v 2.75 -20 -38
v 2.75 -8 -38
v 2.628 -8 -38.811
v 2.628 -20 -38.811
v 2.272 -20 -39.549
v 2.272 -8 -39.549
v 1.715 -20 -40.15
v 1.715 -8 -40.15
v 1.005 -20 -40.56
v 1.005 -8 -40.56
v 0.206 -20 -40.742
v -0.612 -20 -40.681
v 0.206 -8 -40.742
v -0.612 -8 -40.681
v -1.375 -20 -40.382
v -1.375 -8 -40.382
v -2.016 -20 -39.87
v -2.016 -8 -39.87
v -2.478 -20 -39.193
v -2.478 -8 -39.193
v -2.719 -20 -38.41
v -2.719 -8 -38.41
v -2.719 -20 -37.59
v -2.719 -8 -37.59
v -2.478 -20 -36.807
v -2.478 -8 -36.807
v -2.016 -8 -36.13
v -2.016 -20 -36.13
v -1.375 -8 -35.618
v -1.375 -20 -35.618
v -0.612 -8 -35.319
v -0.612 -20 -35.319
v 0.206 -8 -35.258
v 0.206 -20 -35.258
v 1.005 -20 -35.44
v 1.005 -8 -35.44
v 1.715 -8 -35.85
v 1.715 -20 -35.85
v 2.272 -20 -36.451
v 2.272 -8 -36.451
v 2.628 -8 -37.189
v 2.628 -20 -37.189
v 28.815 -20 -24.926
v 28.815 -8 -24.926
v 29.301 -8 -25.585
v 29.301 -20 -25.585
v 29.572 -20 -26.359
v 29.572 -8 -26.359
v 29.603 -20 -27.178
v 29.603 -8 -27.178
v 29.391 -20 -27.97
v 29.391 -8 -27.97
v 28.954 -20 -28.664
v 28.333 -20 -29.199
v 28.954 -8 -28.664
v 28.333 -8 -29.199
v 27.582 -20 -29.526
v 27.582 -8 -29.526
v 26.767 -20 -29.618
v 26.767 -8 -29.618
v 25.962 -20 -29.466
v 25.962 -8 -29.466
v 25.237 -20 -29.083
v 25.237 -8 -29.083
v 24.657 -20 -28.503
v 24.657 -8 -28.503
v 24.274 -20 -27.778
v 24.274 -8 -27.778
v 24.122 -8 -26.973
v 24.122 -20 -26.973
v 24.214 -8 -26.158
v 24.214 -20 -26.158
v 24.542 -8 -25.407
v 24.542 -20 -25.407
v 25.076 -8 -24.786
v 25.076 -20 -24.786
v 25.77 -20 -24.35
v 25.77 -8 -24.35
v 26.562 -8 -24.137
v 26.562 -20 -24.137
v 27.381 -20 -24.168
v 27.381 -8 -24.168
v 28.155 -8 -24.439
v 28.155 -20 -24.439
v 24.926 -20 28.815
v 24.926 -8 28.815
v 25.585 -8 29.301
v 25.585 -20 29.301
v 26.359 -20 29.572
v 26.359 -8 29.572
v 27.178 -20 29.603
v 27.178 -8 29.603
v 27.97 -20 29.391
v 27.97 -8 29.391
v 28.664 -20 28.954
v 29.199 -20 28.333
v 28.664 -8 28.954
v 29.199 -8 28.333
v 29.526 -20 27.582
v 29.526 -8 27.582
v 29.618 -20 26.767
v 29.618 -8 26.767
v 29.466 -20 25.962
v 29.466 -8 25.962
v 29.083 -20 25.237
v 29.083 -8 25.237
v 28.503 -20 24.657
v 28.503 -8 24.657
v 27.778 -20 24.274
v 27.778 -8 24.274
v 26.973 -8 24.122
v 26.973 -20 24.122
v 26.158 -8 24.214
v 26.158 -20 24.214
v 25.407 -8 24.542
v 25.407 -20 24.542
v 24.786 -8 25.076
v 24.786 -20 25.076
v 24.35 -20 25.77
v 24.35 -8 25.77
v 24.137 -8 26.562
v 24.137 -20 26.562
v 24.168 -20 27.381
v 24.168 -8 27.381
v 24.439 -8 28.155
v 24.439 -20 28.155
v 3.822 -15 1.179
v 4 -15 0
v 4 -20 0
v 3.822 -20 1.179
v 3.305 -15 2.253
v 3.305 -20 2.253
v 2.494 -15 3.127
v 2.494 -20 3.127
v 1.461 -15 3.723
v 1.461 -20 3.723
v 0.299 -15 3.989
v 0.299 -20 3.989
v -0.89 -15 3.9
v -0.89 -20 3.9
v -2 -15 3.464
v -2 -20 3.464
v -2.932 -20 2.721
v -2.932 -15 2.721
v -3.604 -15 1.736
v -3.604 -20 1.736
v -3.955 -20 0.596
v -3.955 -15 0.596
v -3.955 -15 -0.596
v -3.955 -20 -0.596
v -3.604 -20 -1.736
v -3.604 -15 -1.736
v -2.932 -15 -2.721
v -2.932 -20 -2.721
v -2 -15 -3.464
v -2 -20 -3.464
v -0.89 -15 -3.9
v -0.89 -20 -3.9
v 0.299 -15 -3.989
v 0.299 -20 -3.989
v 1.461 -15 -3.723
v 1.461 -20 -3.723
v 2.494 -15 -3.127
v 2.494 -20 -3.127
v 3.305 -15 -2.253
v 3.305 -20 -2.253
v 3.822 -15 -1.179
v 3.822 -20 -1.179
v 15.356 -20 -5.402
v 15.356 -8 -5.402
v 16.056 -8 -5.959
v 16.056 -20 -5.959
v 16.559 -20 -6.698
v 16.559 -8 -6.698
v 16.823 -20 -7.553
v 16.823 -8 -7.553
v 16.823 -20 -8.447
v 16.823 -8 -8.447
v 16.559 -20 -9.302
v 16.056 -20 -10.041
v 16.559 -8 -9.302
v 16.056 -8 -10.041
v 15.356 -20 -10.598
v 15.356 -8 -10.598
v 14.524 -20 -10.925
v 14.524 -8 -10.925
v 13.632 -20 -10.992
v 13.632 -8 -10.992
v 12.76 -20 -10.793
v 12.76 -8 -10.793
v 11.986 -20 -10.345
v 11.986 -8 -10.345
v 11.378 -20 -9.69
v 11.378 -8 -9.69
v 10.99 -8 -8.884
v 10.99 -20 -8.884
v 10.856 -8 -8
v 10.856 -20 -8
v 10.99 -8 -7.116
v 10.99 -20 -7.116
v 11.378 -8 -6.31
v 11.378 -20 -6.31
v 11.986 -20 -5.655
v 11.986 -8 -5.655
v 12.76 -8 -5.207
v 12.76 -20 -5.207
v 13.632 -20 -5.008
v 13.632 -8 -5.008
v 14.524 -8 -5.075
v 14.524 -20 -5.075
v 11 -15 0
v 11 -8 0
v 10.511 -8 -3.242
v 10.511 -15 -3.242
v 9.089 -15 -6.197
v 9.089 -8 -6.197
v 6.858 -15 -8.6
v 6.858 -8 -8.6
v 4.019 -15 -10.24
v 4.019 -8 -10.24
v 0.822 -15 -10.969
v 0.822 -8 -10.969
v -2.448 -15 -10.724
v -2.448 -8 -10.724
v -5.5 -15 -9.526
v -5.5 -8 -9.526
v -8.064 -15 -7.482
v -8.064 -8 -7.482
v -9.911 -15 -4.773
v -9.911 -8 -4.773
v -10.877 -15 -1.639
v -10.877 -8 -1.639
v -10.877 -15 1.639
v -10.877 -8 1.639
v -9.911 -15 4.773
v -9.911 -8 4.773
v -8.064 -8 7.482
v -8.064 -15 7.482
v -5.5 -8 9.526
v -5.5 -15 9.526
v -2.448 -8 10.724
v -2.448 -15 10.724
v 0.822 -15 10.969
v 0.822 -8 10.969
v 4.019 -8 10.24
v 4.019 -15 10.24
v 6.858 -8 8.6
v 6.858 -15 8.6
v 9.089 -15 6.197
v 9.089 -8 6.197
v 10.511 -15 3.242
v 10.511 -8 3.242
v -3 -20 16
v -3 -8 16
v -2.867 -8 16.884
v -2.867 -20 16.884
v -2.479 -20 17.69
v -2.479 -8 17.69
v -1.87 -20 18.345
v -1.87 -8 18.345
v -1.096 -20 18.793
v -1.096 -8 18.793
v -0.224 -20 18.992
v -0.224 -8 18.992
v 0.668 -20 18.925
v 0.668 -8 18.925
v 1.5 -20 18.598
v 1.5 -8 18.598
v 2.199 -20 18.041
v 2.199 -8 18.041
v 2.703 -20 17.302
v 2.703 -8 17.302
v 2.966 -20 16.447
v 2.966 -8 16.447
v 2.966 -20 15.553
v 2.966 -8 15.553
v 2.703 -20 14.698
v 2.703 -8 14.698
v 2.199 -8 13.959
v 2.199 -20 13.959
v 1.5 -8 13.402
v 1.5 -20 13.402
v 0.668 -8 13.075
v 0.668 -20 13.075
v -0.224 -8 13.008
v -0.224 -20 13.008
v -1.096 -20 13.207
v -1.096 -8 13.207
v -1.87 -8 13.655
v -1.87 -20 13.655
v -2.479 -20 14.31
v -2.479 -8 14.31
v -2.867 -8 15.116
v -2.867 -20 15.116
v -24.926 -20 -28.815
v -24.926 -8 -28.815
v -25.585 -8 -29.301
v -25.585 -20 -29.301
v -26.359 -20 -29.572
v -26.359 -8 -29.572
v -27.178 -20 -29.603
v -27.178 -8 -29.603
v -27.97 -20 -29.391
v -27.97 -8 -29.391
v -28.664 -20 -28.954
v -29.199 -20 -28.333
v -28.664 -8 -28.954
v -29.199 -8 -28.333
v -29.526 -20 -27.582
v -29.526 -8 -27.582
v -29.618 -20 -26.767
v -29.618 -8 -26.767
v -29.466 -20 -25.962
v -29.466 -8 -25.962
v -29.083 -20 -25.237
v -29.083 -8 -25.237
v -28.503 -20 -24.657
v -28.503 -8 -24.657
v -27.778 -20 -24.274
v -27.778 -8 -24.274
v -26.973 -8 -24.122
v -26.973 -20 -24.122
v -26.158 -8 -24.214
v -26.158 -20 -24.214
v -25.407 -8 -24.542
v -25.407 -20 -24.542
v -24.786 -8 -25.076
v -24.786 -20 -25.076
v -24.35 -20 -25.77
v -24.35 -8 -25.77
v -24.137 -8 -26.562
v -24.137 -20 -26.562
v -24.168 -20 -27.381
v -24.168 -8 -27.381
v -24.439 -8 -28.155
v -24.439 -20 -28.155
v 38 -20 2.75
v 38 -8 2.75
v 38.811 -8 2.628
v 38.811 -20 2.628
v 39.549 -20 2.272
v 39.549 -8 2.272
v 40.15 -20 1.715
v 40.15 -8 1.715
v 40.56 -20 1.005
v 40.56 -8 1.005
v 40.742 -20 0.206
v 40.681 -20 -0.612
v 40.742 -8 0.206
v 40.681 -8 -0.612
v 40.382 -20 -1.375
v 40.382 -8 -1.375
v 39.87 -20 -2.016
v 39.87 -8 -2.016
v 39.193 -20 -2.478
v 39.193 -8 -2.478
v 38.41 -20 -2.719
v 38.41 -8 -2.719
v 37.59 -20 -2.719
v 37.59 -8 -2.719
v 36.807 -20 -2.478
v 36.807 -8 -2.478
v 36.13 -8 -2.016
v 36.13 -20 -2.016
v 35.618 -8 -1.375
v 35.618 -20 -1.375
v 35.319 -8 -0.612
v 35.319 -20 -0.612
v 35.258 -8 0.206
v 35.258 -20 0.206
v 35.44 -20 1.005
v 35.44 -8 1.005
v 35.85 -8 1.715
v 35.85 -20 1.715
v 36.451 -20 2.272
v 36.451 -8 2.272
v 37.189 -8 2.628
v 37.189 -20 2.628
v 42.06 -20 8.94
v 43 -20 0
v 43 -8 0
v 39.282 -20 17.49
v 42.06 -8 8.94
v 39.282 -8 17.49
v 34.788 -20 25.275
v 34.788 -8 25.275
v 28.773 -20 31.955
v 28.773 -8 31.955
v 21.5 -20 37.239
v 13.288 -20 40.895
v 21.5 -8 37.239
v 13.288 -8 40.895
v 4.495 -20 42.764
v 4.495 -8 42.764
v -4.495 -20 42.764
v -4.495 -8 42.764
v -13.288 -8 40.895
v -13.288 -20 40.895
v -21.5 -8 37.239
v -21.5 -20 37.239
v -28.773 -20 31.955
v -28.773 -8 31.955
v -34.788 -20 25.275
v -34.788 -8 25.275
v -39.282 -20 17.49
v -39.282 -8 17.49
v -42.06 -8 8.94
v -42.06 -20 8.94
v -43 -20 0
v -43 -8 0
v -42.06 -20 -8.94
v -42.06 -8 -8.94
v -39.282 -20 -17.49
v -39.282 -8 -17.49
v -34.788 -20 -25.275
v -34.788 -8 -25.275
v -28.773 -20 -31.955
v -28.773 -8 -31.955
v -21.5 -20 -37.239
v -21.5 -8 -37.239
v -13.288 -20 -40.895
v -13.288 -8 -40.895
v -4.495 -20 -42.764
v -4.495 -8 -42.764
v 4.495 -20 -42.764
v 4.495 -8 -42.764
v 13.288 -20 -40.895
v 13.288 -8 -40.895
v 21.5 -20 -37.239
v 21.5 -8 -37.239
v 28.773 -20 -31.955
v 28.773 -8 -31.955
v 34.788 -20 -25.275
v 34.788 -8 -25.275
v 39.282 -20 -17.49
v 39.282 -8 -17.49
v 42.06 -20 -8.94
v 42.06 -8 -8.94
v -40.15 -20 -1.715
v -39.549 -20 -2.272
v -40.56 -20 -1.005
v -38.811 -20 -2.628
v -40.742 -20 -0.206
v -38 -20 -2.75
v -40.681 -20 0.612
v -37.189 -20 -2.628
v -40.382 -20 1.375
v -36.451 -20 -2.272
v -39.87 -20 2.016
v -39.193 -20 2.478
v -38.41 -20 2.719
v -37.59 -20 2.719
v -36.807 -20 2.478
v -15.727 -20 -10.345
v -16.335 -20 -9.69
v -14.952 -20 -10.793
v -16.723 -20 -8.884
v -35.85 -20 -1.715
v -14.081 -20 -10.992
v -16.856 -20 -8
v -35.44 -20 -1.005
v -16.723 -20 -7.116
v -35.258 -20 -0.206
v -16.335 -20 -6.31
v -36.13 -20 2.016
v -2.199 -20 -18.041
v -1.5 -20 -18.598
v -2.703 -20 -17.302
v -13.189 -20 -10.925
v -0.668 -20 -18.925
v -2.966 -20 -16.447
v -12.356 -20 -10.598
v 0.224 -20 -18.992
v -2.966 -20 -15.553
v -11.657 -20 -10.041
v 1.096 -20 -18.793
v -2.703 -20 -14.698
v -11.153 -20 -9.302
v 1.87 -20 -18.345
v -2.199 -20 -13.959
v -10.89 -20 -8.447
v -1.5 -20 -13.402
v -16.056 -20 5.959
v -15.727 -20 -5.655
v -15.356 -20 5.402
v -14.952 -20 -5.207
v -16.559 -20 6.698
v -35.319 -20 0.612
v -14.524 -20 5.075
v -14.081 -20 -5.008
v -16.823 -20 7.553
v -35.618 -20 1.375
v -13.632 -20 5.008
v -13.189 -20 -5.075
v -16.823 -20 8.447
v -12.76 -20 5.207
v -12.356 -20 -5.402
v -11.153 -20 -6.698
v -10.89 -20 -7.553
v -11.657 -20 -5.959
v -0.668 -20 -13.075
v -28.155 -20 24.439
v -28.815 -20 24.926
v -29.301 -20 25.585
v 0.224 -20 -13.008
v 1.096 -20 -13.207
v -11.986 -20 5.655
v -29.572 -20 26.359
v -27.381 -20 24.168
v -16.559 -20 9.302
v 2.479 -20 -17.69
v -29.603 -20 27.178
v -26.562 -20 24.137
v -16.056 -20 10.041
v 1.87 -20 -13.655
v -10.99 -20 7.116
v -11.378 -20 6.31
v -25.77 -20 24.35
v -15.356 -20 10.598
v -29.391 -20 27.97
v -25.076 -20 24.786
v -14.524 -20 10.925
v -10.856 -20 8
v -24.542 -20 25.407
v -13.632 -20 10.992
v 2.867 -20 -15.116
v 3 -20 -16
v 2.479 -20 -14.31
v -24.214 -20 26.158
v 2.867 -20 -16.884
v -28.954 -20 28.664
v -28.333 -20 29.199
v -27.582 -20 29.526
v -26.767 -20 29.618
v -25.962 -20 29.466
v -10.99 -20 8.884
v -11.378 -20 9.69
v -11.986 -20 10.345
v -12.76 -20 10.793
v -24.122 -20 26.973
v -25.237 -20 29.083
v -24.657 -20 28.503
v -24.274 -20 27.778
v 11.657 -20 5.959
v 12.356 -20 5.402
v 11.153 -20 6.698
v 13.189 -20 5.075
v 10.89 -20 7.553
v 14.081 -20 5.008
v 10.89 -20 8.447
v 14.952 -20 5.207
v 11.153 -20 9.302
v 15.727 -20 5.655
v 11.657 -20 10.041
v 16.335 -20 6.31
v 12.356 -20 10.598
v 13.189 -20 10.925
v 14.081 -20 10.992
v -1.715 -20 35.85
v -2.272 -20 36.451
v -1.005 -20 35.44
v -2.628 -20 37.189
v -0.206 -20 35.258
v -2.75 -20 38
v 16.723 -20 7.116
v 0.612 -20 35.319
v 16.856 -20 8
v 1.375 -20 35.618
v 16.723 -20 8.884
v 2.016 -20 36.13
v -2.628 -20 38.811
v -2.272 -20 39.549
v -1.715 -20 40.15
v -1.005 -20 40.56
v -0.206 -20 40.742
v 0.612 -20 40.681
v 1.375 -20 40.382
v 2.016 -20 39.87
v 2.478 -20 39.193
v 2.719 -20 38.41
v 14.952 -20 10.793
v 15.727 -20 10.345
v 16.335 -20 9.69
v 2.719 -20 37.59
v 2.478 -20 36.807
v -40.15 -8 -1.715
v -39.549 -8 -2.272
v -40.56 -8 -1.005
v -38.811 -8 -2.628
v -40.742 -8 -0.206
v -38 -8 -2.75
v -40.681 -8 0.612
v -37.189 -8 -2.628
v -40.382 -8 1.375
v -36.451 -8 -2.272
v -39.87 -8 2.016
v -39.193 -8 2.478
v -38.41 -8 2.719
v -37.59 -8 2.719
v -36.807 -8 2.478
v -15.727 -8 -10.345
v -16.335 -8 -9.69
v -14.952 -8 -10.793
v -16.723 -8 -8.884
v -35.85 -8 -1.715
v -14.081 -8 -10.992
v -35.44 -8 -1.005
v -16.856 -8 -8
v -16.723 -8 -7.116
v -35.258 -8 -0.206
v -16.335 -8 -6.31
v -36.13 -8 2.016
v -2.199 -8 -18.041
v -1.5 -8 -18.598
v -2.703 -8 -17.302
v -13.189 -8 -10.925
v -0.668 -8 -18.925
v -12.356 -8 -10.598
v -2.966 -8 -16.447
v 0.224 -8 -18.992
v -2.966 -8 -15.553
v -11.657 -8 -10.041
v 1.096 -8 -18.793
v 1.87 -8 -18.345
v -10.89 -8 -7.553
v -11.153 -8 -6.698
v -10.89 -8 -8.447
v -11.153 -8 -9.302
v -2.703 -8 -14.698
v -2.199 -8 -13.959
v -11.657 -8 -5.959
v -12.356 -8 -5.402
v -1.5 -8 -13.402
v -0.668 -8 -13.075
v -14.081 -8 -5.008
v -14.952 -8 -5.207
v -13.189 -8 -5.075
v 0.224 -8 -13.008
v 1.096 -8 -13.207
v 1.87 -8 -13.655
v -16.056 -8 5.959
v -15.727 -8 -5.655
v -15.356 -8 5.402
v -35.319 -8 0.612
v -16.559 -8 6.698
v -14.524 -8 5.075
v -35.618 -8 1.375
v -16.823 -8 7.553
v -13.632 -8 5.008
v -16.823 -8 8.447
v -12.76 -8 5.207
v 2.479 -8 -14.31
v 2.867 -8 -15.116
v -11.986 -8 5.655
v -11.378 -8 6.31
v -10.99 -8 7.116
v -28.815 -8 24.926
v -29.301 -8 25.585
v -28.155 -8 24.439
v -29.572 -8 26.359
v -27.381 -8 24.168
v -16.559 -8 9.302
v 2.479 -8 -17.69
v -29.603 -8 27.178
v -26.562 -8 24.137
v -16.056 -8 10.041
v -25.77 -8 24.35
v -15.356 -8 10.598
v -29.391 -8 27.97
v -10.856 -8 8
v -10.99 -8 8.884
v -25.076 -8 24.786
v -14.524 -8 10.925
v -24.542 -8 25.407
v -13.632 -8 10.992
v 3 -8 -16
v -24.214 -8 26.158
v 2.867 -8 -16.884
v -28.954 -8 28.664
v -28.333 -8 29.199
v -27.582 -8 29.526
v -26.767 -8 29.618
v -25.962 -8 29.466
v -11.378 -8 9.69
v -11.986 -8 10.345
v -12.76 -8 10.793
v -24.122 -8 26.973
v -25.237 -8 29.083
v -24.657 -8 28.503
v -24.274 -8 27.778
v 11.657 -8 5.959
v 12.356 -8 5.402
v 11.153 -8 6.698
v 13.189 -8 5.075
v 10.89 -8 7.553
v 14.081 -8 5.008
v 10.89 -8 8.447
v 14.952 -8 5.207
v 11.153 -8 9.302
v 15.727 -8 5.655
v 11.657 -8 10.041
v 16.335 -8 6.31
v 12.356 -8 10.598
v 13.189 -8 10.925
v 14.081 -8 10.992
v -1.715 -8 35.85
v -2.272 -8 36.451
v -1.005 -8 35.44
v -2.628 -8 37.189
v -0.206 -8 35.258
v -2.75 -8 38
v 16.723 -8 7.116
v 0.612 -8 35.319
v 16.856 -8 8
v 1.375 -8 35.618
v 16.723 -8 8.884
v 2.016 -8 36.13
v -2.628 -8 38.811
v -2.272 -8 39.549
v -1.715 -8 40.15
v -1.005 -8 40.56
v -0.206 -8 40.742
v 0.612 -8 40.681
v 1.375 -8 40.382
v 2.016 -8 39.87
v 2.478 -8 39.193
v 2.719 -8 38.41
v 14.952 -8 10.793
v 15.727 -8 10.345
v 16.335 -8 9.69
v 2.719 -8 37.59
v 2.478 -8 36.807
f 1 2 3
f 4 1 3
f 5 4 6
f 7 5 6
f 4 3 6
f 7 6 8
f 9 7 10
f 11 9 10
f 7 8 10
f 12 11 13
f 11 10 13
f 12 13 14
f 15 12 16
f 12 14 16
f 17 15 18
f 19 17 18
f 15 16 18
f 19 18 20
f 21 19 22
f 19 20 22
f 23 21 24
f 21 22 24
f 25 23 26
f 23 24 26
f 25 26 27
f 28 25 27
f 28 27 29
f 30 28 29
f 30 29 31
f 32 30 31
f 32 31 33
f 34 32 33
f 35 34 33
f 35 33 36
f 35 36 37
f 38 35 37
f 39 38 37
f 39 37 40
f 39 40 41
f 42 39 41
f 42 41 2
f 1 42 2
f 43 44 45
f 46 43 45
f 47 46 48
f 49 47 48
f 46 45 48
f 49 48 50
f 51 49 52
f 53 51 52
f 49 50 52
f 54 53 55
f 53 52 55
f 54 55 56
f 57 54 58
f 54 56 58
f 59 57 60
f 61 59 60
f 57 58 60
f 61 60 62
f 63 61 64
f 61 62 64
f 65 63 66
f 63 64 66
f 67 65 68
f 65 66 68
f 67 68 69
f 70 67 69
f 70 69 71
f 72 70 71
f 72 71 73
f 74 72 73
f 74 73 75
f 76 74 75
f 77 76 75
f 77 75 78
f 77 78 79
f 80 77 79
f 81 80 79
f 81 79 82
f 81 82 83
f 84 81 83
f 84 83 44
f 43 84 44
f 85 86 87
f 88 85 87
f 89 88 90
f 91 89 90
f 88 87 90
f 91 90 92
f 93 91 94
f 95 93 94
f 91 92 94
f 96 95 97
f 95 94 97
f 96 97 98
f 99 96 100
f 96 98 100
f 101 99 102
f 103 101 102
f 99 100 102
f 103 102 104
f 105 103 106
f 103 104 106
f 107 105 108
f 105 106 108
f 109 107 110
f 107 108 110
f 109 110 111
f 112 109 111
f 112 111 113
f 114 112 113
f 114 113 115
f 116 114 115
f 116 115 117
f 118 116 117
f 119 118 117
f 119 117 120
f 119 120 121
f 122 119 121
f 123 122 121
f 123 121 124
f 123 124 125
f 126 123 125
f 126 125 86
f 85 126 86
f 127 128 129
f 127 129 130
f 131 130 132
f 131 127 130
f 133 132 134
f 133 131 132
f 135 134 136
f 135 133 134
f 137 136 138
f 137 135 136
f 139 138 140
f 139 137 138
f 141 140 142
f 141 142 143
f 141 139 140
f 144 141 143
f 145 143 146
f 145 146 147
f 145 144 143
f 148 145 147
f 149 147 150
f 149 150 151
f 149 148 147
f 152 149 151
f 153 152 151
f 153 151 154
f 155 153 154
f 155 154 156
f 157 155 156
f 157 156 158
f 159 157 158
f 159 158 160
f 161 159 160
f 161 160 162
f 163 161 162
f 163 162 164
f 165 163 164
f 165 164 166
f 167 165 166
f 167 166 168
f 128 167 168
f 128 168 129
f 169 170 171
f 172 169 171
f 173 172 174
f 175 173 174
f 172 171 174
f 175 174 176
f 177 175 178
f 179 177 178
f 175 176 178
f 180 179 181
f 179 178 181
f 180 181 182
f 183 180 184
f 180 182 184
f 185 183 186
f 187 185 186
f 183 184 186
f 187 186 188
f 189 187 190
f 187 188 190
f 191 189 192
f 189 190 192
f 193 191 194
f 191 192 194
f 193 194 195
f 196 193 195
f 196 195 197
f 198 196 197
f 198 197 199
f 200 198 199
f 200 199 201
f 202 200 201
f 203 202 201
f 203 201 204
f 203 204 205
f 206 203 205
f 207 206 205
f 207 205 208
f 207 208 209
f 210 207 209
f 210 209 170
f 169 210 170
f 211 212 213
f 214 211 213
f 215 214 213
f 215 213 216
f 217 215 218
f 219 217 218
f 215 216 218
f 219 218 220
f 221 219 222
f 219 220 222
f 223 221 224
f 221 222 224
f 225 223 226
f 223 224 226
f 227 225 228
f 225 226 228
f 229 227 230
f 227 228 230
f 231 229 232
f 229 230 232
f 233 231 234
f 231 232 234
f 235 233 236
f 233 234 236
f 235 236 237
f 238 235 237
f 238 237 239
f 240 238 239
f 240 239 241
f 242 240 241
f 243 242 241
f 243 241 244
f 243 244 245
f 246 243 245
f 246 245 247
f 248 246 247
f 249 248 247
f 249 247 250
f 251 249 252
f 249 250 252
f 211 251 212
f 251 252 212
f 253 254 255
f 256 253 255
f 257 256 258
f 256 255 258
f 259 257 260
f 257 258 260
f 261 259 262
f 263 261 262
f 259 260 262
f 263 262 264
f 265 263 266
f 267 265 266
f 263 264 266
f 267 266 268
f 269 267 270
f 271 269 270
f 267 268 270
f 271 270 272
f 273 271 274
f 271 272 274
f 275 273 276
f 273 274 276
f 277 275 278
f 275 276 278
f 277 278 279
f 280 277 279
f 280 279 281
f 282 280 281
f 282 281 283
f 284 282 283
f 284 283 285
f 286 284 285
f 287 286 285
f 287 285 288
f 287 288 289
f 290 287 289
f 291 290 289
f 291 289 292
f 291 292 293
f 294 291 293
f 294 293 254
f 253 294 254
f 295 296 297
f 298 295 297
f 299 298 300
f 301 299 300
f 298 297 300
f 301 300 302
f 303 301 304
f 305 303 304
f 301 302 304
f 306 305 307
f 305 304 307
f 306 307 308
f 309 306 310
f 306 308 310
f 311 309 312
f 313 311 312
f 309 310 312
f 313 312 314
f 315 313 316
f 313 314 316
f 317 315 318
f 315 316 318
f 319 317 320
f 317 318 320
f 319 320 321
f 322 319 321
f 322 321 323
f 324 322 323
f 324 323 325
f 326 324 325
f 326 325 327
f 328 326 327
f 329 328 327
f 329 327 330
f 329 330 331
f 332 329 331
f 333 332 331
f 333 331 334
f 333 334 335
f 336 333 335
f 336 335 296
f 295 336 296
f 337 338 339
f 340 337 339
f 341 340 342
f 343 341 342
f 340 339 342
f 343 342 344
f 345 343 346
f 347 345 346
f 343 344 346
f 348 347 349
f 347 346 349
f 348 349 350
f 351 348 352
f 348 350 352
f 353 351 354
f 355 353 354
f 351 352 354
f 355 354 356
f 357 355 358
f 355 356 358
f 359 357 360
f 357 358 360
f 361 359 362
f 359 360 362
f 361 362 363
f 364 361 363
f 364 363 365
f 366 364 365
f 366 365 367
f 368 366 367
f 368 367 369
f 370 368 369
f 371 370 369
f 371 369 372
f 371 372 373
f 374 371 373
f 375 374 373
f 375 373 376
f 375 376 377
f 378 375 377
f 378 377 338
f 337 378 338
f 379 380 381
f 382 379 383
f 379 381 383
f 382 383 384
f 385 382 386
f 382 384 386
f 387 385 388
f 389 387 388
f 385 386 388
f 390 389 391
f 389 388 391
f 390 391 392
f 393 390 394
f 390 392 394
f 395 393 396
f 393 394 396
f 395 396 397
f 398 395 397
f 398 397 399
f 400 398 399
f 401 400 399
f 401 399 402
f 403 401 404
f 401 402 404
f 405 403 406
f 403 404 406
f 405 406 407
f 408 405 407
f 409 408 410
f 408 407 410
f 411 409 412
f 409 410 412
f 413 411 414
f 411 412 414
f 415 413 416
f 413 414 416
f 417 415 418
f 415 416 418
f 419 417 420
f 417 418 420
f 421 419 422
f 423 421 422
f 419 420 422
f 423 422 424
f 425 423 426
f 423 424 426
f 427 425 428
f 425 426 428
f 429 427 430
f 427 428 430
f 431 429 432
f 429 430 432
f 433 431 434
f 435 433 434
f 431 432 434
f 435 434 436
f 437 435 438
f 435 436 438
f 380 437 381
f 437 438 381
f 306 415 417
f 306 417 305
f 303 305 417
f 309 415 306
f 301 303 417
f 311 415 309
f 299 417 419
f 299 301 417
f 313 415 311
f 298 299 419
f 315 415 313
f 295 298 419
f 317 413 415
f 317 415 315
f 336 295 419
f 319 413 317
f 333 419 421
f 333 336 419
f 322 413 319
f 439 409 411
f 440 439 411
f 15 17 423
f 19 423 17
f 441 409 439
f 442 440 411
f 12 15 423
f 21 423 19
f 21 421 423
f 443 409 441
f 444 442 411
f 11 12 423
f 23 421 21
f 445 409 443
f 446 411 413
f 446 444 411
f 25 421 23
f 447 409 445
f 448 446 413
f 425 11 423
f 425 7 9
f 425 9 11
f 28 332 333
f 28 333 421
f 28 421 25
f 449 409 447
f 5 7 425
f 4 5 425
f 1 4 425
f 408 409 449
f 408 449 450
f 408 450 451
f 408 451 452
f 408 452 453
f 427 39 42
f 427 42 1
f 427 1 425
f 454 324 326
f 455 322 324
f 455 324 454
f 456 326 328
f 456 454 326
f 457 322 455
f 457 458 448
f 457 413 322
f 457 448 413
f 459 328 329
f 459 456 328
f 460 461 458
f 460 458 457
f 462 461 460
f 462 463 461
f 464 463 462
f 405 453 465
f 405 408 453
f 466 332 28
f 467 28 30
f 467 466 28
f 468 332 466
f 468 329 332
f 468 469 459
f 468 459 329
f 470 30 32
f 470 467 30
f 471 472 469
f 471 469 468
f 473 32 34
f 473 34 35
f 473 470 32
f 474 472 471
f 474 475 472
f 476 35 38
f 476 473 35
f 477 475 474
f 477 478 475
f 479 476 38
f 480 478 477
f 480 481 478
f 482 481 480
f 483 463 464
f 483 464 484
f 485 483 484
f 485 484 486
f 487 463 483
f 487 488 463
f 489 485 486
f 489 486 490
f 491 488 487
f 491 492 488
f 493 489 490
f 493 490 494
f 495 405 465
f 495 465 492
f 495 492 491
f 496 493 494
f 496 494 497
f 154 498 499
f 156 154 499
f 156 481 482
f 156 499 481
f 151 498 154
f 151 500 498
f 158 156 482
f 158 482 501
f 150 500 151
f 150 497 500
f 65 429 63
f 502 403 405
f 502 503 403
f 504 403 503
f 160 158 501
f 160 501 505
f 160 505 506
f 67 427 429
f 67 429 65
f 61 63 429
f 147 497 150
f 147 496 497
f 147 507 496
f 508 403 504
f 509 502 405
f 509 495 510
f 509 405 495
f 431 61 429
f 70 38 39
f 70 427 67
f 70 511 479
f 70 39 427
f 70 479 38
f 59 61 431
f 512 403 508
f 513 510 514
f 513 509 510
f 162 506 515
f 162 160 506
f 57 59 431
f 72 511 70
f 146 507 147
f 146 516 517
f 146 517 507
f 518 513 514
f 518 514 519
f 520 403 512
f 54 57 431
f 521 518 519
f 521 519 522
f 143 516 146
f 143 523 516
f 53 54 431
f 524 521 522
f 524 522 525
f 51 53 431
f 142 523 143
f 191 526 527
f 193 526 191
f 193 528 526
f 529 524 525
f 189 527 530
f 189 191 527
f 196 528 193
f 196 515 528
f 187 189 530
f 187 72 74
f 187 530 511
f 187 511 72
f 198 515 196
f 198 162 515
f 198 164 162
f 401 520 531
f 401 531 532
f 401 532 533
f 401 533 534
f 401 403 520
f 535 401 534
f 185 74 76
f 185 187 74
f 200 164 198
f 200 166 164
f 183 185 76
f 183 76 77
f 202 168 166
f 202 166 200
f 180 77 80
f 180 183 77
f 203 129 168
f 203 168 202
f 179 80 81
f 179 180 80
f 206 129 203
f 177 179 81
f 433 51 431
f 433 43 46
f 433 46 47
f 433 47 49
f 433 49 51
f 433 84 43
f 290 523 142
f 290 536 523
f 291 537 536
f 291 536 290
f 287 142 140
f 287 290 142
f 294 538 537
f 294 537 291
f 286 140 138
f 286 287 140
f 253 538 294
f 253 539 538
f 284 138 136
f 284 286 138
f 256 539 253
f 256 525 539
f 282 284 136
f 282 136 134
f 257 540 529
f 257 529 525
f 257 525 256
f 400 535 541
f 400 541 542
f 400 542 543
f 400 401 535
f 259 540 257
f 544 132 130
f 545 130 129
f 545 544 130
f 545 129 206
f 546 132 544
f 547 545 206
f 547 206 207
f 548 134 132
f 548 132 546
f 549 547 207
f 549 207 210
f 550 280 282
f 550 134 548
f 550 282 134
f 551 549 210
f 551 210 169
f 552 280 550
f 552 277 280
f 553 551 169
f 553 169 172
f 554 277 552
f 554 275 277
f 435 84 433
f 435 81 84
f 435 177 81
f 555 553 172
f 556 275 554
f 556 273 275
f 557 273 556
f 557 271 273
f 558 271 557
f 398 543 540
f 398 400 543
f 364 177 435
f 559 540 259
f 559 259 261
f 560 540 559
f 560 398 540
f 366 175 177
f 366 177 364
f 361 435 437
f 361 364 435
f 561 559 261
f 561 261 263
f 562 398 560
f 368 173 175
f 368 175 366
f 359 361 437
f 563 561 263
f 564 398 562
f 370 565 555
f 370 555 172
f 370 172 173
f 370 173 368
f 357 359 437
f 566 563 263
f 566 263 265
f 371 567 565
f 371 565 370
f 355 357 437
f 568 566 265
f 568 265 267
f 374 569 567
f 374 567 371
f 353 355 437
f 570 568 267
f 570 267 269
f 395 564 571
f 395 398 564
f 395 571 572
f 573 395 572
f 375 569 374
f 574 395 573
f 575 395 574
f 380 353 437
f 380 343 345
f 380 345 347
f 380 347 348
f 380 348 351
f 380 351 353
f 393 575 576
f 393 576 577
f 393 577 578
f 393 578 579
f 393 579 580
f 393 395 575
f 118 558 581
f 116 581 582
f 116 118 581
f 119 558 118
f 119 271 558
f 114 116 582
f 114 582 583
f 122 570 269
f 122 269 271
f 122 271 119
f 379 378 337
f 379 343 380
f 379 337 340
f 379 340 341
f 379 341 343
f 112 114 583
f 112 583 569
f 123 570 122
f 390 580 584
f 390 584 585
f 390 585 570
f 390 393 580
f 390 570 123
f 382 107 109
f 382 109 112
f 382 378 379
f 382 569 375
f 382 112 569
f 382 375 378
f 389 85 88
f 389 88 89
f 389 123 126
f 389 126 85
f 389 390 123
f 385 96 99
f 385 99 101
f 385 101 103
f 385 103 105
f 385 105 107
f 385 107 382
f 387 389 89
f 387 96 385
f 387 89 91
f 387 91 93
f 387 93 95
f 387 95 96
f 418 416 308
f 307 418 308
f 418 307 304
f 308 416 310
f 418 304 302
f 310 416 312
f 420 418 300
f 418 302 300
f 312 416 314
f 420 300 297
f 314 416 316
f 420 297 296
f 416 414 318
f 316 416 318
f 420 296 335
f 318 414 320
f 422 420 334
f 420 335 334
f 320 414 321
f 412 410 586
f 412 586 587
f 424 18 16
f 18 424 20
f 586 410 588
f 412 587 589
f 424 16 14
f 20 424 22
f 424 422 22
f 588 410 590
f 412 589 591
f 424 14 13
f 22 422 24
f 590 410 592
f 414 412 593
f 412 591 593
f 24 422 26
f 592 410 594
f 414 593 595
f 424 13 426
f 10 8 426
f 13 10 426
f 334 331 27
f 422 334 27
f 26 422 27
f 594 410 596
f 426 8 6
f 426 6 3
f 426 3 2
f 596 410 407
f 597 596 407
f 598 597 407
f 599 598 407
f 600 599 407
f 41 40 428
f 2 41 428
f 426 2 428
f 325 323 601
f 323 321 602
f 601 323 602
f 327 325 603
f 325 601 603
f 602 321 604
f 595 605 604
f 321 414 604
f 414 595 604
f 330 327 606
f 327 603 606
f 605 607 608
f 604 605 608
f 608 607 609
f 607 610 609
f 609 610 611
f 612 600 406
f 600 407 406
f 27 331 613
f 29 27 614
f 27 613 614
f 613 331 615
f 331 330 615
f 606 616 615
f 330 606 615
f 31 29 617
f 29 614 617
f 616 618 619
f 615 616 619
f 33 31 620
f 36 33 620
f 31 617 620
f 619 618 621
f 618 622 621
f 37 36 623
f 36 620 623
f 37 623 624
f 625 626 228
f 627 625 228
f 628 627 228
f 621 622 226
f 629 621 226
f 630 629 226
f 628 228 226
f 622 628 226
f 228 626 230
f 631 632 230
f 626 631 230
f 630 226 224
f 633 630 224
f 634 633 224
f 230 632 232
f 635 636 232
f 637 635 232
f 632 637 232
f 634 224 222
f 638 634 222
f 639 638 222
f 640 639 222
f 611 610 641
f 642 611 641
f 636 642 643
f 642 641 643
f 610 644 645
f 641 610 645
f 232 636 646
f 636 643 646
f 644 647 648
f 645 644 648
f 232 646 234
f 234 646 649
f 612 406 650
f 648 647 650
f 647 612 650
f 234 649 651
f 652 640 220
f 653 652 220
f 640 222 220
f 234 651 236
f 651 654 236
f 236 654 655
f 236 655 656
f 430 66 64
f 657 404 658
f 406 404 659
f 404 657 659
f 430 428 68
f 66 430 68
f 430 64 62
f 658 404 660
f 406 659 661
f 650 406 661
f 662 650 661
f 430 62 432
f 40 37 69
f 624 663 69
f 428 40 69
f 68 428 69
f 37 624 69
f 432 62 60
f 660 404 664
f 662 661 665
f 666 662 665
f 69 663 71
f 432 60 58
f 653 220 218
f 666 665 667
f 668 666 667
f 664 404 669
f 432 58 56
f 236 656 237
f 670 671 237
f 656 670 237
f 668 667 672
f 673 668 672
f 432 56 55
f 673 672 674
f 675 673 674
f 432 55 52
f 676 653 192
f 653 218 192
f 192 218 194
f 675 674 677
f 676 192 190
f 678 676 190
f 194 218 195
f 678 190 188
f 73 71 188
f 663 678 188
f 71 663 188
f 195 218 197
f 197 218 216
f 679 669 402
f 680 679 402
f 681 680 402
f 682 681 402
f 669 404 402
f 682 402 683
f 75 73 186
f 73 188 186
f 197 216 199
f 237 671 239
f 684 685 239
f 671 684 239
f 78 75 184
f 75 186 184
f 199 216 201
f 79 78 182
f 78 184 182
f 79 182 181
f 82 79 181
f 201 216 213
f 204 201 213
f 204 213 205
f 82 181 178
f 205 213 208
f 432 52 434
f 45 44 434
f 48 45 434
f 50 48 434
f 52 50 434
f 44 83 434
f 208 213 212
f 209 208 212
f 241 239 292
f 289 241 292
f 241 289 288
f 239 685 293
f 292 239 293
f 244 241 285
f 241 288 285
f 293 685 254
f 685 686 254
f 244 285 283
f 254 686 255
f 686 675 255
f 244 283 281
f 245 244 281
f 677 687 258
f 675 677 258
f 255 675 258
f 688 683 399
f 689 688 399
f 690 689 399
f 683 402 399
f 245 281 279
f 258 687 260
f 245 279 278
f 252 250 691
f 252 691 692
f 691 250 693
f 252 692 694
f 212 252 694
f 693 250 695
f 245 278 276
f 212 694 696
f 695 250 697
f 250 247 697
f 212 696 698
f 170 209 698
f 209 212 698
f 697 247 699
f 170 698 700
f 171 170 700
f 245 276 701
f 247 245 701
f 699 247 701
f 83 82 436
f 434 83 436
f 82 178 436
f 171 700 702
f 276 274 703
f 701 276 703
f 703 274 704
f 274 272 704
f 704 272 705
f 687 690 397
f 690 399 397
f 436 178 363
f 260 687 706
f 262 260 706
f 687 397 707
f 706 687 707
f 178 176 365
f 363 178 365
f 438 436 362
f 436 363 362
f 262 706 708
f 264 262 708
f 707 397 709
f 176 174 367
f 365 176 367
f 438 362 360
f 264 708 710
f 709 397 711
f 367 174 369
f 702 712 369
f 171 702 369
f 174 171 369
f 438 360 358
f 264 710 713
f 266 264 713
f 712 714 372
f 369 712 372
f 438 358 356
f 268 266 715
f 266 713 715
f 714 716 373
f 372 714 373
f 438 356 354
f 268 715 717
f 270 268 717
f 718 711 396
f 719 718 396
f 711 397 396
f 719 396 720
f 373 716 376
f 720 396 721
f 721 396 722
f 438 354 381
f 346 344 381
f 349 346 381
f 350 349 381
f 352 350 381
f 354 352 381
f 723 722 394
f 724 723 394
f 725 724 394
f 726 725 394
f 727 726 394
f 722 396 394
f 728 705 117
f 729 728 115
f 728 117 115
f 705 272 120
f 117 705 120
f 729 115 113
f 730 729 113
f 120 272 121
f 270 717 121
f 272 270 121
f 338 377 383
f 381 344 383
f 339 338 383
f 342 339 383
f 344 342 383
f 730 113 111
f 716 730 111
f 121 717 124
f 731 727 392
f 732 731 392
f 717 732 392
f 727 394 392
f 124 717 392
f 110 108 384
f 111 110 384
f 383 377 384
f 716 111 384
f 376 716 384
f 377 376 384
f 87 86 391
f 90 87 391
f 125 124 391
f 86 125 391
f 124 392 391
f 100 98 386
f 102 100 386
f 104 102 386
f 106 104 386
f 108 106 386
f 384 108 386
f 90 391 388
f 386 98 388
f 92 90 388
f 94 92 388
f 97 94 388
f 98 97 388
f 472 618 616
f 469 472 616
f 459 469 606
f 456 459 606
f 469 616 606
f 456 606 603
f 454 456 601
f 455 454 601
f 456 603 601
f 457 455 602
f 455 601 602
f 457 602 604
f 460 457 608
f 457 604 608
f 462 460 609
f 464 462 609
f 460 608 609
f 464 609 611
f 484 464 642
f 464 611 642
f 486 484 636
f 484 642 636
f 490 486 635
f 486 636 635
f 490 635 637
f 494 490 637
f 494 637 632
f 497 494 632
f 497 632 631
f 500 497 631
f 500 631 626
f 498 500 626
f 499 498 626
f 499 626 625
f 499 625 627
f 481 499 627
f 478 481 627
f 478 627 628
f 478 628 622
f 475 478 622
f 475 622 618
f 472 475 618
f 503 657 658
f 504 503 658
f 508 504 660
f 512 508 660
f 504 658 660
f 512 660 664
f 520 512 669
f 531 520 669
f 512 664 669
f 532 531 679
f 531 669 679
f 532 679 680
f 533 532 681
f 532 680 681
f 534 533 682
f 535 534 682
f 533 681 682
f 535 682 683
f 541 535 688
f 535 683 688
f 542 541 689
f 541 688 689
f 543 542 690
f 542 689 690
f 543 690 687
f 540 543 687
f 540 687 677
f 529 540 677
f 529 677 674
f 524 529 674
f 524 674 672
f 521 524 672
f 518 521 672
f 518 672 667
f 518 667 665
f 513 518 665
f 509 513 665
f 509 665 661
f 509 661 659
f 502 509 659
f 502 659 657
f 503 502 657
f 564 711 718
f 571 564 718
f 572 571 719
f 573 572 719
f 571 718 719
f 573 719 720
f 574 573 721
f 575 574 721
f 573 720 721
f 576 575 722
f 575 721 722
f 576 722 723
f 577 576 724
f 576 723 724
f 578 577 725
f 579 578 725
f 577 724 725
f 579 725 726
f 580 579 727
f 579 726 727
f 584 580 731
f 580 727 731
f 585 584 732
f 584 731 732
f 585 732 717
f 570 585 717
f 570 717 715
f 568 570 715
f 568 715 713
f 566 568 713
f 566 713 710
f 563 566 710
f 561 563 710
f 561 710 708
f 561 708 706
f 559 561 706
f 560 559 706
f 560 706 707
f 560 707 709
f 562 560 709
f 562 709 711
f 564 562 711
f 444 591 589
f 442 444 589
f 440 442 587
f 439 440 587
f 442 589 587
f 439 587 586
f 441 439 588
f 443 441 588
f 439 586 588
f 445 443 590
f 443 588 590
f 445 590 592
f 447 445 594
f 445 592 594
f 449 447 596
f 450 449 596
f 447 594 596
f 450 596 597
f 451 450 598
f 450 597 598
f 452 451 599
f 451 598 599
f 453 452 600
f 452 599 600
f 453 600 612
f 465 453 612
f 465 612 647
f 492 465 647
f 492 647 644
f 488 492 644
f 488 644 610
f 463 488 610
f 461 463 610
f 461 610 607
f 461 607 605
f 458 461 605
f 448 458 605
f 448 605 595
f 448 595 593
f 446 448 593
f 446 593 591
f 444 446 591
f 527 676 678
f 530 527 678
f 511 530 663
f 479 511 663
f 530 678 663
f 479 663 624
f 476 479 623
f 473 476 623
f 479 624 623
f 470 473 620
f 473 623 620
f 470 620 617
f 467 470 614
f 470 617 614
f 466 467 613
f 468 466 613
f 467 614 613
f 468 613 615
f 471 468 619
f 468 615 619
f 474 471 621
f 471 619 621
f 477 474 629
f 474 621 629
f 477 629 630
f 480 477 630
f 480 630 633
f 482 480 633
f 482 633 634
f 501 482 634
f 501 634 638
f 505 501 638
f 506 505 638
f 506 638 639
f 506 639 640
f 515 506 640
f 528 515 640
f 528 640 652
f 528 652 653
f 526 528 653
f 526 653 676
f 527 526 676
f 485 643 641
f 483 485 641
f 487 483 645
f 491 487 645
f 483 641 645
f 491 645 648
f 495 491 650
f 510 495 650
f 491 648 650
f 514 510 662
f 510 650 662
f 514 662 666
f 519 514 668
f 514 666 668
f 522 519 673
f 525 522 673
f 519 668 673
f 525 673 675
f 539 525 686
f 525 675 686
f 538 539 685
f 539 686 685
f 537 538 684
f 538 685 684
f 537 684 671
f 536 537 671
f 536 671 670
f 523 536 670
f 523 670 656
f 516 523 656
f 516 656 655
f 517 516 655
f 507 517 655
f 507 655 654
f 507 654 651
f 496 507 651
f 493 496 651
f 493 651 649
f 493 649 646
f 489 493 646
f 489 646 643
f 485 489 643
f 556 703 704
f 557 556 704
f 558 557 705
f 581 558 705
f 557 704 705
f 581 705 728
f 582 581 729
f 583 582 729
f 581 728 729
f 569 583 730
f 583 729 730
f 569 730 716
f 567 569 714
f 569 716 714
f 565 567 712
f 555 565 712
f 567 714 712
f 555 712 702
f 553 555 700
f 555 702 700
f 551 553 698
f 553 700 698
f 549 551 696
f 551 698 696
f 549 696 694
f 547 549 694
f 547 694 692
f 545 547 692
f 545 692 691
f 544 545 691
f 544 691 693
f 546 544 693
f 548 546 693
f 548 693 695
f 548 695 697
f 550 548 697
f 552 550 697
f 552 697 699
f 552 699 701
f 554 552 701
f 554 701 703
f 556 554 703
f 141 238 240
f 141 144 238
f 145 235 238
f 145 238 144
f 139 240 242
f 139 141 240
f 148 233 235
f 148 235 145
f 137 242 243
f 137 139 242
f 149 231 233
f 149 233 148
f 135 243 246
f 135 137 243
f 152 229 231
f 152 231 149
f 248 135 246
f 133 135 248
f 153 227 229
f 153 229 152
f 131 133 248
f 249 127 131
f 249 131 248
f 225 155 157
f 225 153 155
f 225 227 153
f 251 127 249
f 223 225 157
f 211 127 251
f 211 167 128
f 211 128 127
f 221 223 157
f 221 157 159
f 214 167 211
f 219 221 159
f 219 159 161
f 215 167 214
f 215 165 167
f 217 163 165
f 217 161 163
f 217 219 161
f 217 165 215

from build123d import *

# Parameters (mm, degrees)
SKETCH008_R           = 43
SKETCH008_R_2         = 4
PAD002_DEPTH          = 12
SKETCH009_R           = 11
POCKET002_DEPTH       = 7
SKETCH010_R           = 3
POCKET003_DEPTH       = 256.426858
POLARPATTERN001_COUNT = 6
SKETCH011_R           = 2.75
POCKET004_DEPTH       = 256.426858
POLARPATTERN002_COUNT = 8


with BuildPart() as part:
    # Sketch008 (on Face1 of ShapeBinder003) → Pad002 (new body)
    with BuildSketch(Plane.XZ.offset(8)):
        Circle(SKETCH008_R)
        Circle(SKETCH008_R_2, mode=Mode.SUBTRACT)
    extrude(amount=PAD002_DEPTH)

    # Sketch009 (on Face3 of Pad002) → Pocket002 (cut)
    with BuildSketch(Plane(origin=(0, -8, 0), x_dir=(1, 0, 0), z_dir=(0, 1, 0))):
        Circle(SKETCH009_R)
    extrude(amount=-POCKET002_DEPTH, mode=Mode.SUBTRACT)

    # Sketch010 (on Face2 of Pocket002) → Pocket003 (cut, through all)
    with BuildSketch(Plane(origin=(0, -8, 0), x_dir=(1, 0, 0), z_dir=(0, 1, 0))):
        with Locations((0, 16)):
            Circle(SKETCH010_R)
    pocket003 = extrude(amount=-POCKET003_DEPTH, mode=Mode.SUBTRACT)

    # PolarPattern001: Pocket003 ×6 about axis
    polarpattern001_axis = Axis((0, -8, 0), (0, 1, 0))
    for i in range(1, POLARPATTERN001_COUNT):
        add(pocket003.rotate(polarpattern001_axis, i * 360 / POLARPATTERN001_COUNT), mode=Mode.SUBTRACT)

    # Sketch011 (on Face2 of PolarPattern001) → Pocket004 (cut, through all)
    with BuildSketch(Plane(origin=(0, -8, 0), x_dir=(1, 0, 0), z_dir=(0, 1, 0))):
        with Locations((0, 38)):
            Circle(SKETCH011_R)
    pocket004 = extrude(amount=-POCKET004_DEPTH, mode=Mode.SUBTRACT)

    # PolarPattern002: Pocket004 ×8 about axis
    polarpattern002_axis = Axis((0, -8, 0), (0, 1, 0))
    for i in range(1, POLARPATTERN002_COUNT):
        add(pocket004.rotate(polarpattern002_axis, i * 360 / POLARPATTERN002_COUNT), mode=Mode.SUBTRACT)


solid = part.part
